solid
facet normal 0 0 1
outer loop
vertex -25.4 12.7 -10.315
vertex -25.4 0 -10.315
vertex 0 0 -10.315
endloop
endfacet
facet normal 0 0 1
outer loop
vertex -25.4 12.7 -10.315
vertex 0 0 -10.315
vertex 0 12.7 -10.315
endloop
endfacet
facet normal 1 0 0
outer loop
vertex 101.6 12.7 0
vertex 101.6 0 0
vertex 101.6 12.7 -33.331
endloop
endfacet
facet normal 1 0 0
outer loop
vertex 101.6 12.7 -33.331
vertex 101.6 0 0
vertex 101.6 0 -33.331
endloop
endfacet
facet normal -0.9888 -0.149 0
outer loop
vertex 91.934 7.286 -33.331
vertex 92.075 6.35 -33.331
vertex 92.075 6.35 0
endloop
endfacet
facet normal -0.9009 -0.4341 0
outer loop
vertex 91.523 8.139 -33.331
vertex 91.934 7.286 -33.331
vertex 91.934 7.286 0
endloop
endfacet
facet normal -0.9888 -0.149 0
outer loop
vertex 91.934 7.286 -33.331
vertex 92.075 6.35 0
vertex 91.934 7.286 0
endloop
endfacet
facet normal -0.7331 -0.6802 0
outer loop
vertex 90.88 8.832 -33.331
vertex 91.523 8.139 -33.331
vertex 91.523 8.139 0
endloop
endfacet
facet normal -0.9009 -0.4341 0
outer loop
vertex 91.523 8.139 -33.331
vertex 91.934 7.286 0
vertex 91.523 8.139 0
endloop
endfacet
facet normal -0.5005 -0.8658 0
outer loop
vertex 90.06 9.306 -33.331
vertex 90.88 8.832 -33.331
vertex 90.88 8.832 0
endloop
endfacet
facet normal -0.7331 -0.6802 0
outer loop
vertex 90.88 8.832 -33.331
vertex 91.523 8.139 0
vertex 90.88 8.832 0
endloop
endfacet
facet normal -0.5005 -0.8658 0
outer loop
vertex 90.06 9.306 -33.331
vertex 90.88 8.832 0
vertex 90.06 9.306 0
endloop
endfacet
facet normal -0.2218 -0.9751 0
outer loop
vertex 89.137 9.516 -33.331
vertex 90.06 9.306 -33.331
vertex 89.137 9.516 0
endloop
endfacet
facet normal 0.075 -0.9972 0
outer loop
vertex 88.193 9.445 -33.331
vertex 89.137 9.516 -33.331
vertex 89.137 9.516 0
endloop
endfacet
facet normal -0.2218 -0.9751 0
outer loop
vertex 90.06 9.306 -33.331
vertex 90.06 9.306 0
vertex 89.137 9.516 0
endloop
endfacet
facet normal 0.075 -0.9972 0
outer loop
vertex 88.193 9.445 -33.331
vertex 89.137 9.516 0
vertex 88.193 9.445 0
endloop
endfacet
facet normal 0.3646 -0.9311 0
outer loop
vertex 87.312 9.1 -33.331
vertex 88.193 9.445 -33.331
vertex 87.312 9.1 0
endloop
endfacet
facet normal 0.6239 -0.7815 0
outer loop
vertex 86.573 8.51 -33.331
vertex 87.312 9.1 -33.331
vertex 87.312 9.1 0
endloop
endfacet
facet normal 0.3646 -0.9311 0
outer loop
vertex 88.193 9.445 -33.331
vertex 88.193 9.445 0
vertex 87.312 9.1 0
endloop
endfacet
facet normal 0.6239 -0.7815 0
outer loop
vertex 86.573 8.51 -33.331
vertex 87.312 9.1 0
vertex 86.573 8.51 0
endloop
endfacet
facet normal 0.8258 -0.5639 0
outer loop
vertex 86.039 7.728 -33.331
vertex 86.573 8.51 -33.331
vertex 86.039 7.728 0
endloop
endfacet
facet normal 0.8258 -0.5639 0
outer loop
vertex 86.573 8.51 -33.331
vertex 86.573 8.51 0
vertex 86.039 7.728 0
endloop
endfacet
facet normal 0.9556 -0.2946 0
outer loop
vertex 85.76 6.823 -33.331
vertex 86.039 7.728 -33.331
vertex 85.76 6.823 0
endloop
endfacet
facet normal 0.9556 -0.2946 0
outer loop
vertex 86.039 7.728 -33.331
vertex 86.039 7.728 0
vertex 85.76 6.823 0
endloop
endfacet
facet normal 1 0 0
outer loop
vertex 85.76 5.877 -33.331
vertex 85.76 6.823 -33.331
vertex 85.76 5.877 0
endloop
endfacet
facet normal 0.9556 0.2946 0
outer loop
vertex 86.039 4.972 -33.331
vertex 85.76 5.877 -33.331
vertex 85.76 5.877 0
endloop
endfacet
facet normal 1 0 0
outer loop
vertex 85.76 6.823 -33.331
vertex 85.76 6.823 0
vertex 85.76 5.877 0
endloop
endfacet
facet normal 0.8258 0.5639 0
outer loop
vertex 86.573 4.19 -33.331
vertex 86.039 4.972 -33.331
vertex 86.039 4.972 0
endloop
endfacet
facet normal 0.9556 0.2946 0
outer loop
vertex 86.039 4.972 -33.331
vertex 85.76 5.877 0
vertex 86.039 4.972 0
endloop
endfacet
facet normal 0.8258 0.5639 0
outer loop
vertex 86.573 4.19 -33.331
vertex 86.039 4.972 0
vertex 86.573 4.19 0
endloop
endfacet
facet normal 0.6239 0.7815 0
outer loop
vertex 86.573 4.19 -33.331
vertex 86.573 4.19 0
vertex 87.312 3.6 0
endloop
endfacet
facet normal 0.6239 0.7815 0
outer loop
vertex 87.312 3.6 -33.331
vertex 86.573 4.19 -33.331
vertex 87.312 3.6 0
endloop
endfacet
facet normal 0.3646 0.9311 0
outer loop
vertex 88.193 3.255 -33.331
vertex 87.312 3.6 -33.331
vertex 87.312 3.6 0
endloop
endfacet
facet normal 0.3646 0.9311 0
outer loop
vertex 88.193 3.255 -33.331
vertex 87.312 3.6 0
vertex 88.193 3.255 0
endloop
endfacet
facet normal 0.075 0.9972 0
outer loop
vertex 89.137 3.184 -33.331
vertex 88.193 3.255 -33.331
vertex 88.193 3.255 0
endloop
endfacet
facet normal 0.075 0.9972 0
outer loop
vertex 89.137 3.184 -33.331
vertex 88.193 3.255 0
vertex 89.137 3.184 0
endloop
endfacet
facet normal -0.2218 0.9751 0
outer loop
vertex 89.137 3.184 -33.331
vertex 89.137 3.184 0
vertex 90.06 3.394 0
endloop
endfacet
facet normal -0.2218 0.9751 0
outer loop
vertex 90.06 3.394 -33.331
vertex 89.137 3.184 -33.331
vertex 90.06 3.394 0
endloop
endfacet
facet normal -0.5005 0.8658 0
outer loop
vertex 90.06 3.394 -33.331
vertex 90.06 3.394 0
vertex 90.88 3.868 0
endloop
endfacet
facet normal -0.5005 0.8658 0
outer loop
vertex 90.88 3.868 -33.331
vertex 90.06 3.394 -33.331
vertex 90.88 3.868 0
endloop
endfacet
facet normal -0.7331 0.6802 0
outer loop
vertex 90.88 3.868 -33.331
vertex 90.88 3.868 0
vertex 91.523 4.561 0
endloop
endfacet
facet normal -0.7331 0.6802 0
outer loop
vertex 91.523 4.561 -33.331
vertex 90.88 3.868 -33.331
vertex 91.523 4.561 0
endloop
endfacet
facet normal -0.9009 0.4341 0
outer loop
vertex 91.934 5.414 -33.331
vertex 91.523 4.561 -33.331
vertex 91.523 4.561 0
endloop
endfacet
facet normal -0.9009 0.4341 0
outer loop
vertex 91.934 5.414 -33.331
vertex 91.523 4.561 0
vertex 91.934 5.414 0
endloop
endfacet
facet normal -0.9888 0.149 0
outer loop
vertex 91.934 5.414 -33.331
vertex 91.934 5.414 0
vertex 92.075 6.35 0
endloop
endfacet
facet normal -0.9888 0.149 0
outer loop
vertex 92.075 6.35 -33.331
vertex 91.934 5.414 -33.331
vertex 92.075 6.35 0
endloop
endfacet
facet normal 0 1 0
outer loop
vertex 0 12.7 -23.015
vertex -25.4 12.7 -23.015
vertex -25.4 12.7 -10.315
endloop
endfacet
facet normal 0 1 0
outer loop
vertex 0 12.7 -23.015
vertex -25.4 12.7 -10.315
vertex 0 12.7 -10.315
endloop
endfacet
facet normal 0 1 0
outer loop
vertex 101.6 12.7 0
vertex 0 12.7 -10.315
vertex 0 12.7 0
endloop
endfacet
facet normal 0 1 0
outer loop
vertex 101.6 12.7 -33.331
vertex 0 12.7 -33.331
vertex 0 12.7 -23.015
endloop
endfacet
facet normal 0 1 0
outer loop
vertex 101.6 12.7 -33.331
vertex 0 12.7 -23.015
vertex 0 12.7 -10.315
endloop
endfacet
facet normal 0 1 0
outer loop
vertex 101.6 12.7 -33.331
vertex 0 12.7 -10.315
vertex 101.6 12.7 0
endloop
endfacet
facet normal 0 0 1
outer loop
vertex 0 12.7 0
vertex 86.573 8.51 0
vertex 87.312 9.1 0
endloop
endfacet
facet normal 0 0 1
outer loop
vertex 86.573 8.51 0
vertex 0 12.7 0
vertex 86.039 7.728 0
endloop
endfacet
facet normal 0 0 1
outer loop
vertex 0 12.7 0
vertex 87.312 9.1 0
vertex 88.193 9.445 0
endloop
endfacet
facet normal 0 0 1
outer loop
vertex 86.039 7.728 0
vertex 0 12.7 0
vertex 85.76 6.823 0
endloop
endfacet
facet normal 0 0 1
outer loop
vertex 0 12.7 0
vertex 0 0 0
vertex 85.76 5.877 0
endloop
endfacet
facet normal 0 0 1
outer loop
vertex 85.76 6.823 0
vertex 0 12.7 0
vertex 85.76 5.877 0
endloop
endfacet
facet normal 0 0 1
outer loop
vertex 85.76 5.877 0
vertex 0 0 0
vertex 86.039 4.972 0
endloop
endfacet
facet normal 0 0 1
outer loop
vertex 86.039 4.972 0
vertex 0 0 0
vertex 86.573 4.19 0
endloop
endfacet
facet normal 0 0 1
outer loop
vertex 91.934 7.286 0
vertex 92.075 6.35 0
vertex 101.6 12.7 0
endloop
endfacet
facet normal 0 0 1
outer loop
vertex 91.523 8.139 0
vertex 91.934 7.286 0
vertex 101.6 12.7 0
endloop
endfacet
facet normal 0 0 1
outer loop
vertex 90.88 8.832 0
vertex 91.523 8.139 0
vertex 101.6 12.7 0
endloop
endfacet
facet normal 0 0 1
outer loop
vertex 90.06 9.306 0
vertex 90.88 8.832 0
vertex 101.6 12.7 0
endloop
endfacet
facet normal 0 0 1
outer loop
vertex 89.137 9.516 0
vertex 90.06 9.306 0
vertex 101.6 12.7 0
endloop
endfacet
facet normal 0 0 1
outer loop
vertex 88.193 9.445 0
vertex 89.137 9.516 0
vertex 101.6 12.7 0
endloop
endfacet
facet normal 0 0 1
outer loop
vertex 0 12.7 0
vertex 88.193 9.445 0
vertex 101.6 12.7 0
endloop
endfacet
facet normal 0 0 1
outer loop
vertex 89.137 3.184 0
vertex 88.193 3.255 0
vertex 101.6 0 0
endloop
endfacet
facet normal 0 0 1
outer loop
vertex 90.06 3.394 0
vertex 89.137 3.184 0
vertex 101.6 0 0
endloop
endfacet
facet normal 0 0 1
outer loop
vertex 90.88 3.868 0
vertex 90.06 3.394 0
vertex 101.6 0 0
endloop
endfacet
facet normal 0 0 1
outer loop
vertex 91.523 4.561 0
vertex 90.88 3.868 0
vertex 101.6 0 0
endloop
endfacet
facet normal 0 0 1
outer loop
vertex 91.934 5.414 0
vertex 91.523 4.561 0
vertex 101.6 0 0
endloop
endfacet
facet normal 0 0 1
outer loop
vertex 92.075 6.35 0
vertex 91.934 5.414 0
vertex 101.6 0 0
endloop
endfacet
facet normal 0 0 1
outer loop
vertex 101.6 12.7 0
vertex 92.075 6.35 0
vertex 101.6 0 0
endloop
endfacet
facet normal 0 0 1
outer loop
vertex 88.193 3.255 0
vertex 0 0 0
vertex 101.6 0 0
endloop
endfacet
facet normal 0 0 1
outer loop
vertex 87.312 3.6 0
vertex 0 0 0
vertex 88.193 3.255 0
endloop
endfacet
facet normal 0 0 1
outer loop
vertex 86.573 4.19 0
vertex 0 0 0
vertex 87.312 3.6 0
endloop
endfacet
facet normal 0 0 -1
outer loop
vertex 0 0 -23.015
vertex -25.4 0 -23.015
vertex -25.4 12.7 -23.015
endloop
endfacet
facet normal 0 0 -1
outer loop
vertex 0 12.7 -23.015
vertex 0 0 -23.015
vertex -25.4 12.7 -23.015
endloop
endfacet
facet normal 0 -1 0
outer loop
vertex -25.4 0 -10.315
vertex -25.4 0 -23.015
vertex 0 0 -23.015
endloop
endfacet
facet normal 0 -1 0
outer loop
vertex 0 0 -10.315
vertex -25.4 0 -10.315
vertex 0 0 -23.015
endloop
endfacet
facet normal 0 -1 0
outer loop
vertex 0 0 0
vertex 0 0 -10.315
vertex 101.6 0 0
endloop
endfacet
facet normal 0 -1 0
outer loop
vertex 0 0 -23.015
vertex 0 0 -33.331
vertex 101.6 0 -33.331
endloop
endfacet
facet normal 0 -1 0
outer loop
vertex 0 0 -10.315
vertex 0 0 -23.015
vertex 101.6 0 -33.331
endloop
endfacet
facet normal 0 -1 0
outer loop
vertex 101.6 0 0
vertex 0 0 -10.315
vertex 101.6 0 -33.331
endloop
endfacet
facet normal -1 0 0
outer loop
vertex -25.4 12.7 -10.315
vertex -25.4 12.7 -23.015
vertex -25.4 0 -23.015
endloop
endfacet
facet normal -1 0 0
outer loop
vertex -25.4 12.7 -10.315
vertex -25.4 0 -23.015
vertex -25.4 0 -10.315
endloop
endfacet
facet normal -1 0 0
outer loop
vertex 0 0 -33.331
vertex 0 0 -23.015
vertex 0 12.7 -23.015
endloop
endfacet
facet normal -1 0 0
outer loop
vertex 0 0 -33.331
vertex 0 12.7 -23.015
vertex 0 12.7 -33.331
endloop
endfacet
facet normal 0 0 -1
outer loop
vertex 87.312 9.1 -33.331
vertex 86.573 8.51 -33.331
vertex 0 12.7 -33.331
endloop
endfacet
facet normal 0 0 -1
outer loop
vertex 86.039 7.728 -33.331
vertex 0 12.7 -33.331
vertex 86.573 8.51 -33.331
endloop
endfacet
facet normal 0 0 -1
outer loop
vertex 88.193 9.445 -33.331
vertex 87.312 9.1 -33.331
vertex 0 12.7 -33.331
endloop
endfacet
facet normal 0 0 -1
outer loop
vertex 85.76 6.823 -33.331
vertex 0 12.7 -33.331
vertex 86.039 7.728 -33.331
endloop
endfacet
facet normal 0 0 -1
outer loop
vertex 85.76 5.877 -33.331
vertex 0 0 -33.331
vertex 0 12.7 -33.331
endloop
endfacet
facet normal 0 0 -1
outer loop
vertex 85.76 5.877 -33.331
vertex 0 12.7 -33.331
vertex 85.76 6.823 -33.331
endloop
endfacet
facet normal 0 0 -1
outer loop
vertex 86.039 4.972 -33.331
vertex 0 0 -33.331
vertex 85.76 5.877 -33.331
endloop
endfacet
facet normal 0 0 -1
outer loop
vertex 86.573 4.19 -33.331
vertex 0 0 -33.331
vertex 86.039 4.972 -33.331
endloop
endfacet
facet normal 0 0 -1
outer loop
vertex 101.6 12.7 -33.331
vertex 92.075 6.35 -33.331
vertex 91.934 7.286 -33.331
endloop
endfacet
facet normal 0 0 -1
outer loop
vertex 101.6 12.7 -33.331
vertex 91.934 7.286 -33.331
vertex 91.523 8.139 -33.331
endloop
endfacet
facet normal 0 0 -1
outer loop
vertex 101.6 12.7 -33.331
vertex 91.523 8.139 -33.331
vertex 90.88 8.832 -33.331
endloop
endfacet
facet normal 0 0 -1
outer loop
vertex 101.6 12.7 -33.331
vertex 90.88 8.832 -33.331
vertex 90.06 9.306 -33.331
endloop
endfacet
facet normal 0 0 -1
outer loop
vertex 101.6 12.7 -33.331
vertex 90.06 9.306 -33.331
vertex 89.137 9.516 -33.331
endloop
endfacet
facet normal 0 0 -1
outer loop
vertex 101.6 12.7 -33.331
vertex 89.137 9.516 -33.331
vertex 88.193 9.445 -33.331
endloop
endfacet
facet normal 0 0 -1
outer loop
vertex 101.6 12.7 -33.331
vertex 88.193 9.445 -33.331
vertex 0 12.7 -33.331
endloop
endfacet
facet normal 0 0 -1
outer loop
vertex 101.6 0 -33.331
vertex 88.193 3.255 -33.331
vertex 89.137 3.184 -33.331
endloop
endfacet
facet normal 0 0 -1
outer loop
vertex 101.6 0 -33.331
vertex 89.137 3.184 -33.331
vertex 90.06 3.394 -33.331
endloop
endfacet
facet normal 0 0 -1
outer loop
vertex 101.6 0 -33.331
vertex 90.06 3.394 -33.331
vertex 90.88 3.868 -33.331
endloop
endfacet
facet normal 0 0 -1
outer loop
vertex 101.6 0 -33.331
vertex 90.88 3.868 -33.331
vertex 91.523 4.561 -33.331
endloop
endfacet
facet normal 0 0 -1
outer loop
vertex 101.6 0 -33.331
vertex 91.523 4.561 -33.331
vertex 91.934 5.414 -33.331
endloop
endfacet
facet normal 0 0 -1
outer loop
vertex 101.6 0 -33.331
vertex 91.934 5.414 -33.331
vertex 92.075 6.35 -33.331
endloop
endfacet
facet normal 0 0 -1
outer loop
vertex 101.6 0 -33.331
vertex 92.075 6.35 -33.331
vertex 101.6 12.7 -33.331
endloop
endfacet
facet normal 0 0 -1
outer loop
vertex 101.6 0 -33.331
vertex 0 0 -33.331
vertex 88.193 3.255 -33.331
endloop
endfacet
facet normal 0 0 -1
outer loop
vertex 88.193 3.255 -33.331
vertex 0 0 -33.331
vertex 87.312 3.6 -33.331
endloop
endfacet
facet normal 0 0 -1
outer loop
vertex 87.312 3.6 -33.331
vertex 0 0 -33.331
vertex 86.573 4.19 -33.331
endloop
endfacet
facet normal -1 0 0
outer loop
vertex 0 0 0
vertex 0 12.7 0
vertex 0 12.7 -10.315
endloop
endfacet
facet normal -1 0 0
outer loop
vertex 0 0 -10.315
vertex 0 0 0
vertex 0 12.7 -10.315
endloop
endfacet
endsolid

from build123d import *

# Parameters (mm, degrees)
SKETCH1_W           = 101.6
SKETCH1_H           = 33.330801688
BOSS_EXTRUDE1_DEPTH = 12.7
SKETCH2_W           = 12.7
SKETCH2_H           = 12.7
BOSS_EXTRUDE2_DEPTH = 25.4
SKETCH4_R           = 3.175
CUT_EXTRUDE2_DEPTH  = 108.679117479


with BuildPart() as part:
    # Sketch1 → Boss-Extrude1 (new body)
    with BuildSketch(Plane(origin=(0, 0, 0), x_dir=(1, 0, 0), z_dir=(0, 1, 0))):
        with Locations((50.8, 16.665400844)):
            Rectangle(SKETCH1_W, SKETCH1_H)
    extrude(amount=BOSS_EXTRUDE1_DEPTH)

    # Sketch2 → Boss-Extrude2 (add)
    with BuildSketch(Plane.ZY):
        with Locations((-16.665400844, 6.35)):
            Rectangle(SKETCH2_W, SKETCH2_H)
    extrude(amount=BOSS_EXTRUDE2_DEPTH)

    # Sketch4 → Cut-Extrude2 (cut, through all)
    with BuildSketch(Plane.XY):
        with Locations((88.9, 6.35)):
            Circle(SKETCH4_R)
    extrude(amount=-CUT_EXTRUDE2_DEPTH, mode=Mode.SUBTRACT)


solid = part.part
